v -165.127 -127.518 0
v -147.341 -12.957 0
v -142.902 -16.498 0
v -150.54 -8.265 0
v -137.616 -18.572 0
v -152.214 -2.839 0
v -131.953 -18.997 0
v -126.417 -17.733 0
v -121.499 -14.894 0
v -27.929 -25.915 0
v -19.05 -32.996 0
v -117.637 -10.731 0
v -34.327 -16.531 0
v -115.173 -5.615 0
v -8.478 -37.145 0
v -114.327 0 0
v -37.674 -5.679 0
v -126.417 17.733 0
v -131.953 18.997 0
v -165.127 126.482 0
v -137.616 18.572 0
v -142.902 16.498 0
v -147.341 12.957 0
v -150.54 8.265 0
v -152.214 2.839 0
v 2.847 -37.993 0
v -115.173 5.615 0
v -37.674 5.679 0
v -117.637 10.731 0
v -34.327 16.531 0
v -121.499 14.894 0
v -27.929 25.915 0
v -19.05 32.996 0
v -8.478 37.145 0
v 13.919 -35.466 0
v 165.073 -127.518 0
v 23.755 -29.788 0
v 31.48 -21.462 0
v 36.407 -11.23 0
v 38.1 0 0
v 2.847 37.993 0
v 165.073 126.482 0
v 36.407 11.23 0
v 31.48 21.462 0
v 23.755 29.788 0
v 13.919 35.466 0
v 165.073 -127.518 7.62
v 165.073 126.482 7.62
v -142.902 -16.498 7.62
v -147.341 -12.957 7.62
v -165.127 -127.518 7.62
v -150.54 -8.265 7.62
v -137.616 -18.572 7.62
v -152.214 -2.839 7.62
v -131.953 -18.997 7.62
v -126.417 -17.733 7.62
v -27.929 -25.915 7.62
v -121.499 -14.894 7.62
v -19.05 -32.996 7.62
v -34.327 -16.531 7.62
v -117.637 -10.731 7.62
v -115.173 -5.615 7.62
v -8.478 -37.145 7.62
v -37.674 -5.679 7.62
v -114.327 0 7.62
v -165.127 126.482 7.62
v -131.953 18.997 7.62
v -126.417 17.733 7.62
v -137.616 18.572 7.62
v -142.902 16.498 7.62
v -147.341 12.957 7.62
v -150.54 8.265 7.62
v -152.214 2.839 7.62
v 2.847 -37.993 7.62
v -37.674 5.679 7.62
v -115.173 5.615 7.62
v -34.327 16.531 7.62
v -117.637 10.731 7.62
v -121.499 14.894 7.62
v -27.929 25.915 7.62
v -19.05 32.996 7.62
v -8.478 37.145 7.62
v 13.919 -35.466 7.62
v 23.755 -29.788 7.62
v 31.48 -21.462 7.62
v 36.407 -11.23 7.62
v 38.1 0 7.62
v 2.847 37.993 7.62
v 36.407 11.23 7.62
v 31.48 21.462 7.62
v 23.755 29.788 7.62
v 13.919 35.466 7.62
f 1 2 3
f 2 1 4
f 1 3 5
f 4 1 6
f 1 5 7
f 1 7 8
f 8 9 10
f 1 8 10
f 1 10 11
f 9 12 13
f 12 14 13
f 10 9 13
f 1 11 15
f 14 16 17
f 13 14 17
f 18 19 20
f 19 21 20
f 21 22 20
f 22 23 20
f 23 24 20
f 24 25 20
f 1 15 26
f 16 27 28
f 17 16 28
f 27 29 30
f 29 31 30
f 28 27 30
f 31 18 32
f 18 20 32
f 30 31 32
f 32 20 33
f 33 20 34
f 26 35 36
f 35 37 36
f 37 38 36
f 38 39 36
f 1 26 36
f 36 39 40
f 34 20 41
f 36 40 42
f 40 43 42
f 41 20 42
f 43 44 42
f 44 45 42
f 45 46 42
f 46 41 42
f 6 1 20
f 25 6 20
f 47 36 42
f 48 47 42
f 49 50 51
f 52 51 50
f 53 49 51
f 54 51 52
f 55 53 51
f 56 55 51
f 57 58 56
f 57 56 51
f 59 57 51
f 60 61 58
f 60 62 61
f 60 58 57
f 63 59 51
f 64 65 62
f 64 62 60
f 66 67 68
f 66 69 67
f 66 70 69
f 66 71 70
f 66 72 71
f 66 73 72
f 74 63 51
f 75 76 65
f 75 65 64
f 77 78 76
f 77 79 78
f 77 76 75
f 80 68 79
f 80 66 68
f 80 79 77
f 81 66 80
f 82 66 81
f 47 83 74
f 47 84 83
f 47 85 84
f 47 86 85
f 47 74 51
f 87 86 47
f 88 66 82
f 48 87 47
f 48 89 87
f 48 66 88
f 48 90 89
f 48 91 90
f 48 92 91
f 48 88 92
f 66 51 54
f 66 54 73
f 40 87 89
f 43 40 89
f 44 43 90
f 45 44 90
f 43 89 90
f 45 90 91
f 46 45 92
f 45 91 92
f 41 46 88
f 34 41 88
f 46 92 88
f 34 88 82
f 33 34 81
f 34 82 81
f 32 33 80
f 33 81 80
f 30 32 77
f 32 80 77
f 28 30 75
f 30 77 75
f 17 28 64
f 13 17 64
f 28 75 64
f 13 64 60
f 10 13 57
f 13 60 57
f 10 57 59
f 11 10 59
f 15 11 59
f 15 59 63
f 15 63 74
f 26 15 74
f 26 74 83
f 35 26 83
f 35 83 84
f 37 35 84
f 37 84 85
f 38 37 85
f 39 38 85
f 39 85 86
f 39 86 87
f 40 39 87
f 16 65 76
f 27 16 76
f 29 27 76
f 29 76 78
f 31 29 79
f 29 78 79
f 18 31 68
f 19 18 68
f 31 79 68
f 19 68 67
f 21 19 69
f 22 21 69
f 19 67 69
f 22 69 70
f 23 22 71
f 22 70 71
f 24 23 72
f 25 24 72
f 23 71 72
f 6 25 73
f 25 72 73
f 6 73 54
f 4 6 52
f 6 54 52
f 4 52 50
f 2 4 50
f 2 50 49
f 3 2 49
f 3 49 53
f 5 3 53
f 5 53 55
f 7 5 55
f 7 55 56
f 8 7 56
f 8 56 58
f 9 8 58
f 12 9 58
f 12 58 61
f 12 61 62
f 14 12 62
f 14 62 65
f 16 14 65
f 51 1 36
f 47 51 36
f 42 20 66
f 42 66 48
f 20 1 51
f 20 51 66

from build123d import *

# Parameters (mm, degrees)
F0_W     = 330.2
F0_H     = 254
F1_DEPTH = 7.62
F2_R     = 38.1
F4_DEPTH = 7.621
F3_R     = 19.05
F5_DEPTH = 7.621


with BuildPart() as f1:
    # F0 (on Top) → F1 (new body)
    with BuildSketch(Plane.XY):
        with Locations((-0.02661, -0.518168)):
            Rectangle(F0_W, F0_H)
    extrude(amount=F1_DEPTH)

    # F2 (on face) → F4 (cut, through all)
    with BuildSketch(Plane.XY.offset(7.62)):
        Circle(F2_R)
    extrude(amount=-F4_DEPTH, mode=Mode.SUBTRACT)

    # F3 (on face) → F5 (cut, through all)
    with BuildSketch(Plane.XY.offset(7.62)):
        with Locations((-133.37661, 0)):
            Circle(F3_R)
    extrude(amount=-F5_DEPTH, mode=Mode.SUBTRACT)


solid = f1.part
